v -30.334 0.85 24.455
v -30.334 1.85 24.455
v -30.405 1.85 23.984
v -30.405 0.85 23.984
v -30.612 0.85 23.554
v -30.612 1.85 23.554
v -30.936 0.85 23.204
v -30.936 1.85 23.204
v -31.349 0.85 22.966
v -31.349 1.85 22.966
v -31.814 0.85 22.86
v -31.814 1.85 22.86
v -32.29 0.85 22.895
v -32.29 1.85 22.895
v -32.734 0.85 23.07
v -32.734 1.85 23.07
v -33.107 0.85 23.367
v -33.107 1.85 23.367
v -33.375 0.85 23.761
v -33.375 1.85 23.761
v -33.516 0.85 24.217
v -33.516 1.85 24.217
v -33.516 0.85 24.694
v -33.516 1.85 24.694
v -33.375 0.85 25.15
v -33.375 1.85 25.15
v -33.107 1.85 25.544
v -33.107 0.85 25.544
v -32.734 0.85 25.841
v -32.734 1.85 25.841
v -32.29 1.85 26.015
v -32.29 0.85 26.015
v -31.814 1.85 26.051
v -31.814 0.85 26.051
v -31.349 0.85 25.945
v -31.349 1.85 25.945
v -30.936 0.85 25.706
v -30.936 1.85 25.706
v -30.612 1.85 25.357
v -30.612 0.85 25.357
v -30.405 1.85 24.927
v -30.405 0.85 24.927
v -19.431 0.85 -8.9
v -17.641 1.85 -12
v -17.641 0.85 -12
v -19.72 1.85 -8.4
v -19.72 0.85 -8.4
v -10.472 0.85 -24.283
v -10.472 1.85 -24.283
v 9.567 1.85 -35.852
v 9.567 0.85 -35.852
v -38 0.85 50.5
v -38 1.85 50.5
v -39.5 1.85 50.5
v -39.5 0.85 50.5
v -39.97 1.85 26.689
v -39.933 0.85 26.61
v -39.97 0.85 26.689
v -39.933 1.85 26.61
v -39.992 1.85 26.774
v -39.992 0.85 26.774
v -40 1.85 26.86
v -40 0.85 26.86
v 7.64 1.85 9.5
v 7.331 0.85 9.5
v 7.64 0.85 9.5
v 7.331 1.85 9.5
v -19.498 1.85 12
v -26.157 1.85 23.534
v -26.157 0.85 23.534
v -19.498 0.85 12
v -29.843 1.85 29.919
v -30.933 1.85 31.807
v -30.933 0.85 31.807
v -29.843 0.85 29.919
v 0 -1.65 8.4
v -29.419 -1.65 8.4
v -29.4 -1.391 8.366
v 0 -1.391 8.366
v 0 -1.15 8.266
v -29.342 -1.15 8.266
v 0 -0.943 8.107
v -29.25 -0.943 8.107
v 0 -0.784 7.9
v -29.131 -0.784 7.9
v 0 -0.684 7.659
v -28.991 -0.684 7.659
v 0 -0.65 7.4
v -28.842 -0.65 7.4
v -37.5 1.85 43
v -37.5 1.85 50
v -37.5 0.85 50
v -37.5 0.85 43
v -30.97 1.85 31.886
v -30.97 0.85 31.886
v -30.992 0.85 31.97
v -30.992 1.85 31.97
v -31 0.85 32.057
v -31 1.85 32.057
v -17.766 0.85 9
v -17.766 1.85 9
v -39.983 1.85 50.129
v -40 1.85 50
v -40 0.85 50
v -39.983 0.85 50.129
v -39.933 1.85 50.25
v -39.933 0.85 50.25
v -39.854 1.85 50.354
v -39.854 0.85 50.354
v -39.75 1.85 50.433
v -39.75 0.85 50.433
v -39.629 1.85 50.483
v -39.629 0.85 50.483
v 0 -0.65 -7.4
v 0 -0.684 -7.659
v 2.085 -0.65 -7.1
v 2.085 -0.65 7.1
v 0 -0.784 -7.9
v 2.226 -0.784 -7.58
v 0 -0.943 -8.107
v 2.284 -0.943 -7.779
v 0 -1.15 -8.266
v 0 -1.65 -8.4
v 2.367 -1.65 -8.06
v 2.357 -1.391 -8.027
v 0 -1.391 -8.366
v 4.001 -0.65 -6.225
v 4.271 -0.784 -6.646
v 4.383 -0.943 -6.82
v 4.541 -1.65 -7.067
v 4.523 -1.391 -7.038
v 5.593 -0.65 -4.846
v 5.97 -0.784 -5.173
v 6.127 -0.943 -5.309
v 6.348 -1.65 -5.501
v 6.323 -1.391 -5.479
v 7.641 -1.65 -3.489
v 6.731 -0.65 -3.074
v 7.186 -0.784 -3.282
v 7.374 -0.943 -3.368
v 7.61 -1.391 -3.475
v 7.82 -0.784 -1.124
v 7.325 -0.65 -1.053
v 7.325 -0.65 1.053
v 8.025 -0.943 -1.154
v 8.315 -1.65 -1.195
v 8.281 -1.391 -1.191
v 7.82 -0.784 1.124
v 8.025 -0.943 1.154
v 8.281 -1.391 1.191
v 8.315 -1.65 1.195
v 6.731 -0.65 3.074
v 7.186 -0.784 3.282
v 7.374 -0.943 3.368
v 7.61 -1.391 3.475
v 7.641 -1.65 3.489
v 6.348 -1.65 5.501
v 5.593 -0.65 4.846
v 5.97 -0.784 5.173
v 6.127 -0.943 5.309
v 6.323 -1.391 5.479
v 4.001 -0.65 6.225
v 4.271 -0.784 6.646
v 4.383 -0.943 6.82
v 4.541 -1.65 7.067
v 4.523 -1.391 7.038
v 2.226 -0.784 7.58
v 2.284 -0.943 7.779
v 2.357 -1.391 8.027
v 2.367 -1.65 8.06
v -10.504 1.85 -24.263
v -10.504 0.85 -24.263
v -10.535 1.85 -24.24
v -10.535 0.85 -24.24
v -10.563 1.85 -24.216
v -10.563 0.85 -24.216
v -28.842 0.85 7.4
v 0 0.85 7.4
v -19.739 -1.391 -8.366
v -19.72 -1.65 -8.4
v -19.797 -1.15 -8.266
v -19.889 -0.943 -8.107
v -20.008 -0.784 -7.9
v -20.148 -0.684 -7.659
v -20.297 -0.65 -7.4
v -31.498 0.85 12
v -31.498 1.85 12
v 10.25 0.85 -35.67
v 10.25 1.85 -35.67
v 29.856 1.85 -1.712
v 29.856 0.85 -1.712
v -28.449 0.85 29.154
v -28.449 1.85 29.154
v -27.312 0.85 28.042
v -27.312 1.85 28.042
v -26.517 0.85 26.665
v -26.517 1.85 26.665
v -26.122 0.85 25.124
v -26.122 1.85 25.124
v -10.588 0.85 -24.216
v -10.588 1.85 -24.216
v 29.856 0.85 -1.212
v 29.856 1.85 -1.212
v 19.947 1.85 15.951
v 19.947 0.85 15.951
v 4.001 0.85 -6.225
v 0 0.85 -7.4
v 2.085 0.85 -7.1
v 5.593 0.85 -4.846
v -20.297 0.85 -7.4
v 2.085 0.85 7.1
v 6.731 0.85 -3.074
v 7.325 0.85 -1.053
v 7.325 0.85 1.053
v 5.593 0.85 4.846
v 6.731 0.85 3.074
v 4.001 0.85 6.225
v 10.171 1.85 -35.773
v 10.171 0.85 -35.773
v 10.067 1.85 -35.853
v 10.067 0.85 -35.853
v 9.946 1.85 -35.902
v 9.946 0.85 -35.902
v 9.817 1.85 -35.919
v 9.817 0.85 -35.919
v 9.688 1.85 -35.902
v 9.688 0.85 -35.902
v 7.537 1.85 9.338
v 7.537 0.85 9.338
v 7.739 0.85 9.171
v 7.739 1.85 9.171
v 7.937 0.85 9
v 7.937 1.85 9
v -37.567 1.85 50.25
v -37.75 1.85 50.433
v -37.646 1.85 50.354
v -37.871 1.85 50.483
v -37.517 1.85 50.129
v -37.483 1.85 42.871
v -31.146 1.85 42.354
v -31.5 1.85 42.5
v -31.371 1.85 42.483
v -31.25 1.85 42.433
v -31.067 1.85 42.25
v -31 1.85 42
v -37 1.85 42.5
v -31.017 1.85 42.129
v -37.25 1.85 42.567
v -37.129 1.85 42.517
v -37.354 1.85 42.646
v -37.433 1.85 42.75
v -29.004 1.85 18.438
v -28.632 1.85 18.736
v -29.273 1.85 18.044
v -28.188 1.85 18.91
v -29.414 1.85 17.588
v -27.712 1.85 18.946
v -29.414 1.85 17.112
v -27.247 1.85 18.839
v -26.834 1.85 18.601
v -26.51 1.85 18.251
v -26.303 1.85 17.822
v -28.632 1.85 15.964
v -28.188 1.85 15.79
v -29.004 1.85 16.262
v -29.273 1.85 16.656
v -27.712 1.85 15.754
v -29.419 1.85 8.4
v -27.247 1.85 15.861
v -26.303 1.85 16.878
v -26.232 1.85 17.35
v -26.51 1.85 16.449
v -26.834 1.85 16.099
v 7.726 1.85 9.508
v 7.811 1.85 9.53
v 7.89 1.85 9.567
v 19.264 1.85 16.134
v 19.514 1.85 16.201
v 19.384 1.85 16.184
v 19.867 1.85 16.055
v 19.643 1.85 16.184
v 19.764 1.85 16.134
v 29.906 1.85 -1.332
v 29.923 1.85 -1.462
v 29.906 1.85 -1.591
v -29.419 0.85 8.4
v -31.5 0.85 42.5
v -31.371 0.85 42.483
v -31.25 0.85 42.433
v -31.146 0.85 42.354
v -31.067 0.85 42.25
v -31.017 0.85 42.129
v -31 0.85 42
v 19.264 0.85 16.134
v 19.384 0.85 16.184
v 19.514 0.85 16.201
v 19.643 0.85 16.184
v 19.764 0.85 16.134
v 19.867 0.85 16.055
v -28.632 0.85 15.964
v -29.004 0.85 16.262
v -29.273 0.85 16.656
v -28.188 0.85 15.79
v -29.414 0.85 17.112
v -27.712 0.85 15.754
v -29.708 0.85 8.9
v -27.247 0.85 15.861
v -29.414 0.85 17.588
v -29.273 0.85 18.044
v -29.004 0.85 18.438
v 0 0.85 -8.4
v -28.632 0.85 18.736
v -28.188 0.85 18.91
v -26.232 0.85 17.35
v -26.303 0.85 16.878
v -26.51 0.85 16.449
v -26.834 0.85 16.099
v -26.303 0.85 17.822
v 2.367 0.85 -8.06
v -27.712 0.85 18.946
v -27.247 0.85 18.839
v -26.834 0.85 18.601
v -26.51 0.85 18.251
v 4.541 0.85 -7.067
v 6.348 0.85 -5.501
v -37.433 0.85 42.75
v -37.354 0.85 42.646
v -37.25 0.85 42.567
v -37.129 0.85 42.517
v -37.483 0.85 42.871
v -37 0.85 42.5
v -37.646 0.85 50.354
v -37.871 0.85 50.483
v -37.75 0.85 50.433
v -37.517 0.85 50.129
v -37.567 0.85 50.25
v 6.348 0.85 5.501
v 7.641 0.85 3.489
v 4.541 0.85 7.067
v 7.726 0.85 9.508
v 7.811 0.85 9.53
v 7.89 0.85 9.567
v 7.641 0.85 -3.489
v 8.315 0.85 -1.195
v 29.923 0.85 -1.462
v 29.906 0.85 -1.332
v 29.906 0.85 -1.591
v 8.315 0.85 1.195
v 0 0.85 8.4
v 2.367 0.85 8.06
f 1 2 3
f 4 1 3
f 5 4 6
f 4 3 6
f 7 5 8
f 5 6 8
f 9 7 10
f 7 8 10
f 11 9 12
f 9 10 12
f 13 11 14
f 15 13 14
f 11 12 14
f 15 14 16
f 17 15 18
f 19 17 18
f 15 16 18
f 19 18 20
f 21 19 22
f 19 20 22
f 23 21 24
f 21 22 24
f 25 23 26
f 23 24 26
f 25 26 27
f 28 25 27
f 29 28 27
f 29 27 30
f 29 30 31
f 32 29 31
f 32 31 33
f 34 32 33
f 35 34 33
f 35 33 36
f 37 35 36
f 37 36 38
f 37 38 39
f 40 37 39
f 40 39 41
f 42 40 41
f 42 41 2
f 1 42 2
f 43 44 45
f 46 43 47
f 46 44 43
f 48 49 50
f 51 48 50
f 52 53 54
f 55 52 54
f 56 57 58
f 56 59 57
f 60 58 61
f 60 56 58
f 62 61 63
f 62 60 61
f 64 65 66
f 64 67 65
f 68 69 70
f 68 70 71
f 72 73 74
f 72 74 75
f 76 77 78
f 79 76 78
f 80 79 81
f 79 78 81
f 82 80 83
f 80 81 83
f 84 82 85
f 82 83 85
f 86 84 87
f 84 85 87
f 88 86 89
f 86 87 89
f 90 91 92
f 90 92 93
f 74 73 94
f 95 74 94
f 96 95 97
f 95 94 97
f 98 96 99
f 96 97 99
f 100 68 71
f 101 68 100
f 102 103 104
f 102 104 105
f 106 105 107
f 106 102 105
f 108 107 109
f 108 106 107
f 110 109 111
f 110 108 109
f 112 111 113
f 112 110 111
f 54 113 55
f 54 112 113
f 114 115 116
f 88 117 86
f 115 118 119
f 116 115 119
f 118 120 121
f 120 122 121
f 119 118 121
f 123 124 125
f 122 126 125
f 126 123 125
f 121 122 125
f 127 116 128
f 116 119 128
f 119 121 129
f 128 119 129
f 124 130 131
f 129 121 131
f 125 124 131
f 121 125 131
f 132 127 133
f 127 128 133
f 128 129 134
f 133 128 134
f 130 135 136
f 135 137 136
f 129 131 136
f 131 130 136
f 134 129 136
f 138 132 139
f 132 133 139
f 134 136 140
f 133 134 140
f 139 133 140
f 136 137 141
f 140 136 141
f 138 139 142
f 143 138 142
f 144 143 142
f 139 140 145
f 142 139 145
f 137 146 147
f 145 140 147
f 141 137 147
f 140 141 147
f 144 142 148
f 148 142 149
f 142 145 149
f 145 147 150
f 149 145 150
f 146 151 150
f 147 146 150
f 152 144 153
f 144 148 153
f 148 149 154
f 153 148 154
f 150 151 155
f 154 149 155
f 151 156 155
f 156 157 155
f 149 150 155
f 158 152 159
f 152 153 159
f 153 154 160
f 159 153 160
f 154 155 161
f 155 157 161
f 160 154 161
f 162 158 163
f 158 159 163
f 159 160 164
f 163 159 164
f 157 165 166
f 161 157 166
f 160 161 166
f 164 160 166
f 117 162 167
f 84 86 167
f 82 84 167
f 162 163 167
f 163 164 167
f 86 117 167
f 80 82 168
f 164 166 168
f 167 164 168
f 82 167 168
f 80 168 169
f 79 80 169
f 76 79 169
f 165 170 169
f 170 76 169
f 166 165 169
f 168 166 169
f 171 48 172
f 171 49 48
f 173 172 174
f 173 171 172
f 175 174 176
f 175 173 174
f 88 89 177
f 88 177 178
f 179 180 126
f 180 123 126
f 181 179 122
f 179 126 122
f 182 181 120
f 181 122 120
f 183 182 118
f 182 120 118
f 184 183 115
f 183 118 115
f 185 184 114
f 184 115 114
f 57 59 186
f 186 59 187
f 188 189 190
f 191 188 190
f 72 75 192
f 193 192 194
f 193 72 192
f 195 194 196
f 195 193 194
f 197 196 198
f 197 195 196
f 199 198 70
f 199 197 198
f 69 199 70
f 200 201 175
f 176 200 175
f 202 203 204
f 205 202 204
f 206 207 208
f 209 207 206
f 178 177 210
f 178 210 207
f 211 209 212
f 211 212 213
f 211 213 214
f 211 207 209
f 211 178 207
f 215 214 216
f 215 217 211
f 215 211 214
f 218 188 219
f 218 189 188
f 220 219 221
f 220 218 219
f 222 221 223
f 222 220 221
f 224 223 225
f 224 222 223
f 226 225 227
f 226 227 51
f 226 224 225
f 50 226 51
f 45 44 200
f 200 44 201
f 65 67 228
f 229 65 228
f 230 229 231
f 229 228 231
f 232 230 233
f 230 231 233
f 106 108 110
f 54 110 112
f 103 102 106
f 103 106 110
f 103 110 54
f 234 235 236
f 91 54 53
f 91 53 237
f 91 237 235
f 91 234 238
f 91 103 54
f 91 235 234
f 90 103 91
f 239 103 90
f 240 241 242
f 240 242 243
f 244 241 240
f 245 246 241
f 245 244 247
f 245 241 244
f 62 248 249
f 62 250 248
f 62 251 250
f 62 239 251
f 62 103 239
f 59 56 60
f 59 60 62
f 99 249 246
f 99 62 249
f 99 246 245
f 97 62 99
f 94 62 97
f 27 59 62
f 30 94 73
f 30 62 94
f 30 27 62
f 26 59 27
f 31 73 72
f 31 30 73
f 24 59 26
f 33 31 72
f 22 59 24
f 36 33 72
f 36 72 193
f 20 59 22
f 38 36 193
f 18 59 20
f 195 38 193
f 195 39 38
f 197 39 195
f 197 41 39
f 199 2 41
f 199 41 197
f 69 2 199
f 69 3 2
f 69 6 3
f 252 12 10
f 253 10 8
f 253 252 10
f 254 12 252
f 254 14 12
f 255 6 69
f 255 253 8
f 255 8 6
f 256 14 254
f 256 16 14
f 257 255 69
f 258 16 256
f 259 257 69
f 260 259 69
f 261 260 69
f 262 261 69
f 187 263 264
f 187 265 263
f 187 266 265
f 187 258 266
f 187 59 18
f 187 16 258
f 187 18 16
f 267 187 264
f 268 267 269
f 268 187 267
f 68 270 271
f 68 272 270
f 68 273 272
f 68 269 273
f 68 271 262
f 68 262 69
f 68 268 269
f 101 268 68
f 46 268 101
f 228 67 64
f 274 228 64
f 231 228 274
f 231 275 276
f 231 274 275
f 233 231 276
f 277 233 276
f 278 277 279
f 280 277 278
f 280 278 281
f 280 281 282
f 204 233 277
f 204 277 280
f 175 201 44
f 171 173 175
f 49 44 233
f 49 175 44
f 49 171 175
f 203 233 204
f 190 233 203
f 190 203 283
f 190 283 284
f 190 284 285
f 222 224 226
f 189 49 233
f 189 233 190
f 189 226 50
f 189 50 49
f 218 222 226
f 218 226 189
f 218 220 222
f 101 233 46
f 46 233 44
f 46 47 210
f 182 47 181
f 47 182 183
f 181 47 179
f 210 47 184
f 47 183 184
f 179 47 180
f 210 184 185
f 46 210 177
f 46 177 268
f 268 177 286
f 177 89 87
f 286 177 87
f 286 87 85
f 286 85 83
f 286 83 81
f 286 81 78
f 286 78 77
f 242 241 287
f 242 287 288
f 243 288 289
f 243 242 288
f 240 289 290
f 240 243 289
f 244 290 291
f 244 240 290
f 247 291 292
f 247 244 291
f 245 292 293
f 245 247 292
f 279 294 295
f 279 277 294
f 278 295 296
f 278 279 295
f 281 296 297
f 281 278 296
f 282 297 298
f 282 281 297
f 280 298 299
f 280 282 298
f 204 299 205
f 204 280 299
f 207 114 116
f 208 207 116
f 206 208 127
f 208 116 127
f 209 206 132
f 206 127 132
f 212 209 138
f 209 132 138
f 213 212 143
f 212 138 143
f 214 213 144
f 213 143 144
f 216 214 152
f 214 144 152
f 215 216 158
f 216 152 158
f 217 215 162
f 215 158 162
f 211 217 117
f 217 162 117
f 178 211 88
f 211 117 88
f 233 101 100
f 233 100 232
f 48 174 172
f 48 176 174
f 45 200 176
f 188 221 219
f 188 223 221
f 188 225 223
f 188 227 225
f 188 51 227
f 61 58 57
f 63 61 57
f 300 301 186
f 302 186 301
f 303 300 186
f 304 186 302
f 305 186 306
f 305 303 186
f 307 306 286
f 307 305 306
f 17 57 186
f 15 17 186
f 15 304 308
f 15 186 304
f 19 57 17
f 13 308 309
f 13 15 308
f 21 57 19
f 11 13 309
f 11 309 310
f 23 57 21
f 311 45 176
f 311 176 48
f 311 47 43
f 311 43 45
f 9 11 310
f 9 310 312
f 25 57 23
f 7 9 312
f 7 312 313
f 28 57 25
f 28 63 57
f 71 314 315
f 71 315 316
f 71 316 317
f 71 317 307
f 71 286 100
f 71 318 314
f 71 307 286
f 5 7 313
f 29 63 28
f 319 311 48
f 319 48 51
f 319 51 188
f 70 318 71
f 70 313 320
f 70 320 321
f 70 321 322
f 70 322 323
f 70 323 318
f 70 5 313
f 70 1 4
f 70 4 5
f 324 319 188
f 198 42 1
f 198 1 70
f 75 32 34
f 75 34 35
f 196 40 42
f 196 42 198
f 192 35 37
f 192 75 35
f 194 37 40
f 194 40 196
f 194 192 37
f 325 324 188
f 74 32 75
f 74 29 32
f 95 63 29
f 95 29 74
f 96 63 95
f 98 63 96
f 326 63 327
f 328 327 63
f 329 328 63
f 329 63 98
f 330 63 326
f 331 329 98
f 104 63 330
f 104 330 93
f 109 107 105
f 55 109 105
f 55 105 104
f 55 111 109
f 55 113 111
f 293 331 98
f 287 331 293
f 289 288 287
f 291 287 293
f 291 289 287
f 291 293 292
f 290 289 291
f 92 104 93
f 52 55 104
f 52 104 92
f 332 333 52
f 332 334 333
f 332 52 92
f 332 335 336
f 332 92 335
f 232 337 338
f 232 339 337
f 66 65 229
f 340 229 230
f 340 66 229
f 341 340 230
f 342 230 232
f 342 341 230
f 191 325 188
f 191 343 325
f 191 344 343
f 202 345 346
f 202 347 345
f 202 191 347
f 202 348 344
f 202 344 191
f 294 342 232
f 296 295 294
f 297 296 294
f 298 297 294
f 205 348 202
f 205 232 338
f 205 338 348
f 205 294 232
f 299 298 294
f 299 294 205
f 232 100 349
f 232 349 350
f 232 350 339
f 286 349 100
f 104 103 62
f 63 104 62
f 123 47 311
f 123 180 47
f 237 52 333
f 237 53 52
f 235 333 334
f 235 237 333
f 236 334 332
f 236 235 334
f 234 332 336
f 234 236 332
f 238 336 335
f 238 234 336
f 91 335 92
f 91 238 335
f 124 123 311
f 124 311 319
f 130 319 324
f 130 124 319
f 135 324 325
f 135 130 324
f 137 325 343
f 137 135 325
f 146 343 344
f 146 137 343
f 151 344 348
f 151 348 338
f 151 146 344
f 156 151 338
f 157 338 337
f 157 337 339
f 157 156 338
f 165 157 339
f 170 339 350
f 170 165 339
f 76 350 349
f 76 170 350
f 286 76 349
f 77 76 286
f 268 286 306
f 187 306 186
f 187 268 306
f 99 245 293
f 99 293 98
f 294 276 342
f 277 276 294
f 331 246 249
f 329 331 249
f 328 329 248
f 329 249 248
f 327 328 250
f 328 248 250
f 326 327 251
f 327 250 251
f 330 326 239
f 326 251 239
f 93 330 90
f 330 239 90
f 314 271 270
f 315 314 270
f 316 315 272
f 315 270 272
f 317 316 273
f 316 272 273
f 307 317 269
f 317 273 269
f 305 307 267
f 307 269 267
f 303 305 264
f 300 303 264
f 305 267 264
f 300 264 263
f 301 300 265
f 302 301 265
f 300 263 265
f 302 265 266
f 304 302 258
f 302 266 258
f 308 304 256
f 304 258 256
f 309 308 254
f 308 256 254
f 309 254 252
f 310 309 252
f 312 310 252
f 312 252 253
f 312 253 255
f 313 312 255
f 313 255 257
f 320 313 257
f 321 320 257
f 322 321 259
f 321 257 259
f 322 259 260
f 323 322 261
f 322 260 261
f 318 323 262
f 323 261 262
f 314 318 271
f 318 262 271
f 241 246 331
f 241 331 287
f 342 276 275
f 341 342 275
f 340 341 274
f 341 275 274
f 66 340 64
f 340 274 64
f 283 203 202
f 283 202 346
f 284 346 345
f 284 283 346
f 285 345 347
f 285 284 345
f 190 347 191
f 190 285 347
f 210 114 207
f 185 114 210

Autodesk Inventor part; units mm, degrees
ref_plane "YZ Plane" through (0, 0, 0) normal (1, 0, 0) x (0, 1, 0)
ref_plane "XZ Plane" through (0, 0, 0) normal (0, 1, 0) x (-1, 0, 0)
sketch "スケッチ1" plane through (0, 0, 0) normal (0, 1, 0) x (-1, 0, 0)
  circle A0 centre (0, 0) radius 8.9
  line L0 (0, -8.9) -> (63.2748, -8.9)
  line L1 (63.2748, -8.9) -> (63.2748, 8.9)
  line L2 (63.2748, 8.9) -> (0, 8.9)
  line L3 (0, 8.9) -> (0, -8.9)
  circle A1 centre (0, 0) radius 8.4
  line L4 (0, -8.4) -> (63.2748, -8.4)
  line L5 (63.2748, -8.4) -> (63.2748, 8.4)
  line L6 (63.2748, 8.4) -> (0, 8.4)
  line L7 (0, 8.4) -> (0, -8.4)
  point P0 (0, 8.4)
  point P1 (0, 8.9)
  dimension "d0" = 17.8
  dimension "d1" = 16.8
extrude "押し出し1" add sketch "スケッチ1" along normal blind 0.85 contours L3 A1 A0 | L2 L1 L6 A0 | A0 L6 L3 | L3 L4 A0 | A0 L4 L1 L0
sketch "スケッチ2" plane through (0, 0.85, 0) normal (0, 1, 0) x (1, 0, 0)
  circle A0 centre (0, 0) radius 12
  line L0 (0, 12) -> (-63.2748, 12)
  line L1 (-63.2748, 12) -> (-63.2748, -12)
  line L2 (-63.2748, -12) -> (0, -12)
  line L3 (0, -12) -> (0, 12)
  line L4 (-63.2748, 8.9) -> (-63.2748, 8.4) projected
  line L5 (-63.2748, 8.4) -> (0, 8.4) projected
  line L6 (0, -8.4) -> (-63.2748, -8.4) projected
  arc A1 (0, -8.4) -> (0, 8.4) centre (0, 0) ccw projected
  point P0 (0, -12)
  dimension "d4" = 24
extrude "押し出し2" add sketch "スケッチ2" along normal blind 1 contours A0 L3 A1 | L3 L5 A0 | A0 L5 L1 L0 | L2 L1 L6 A0 | A0 L6 L3
mirror "ミラー1" about plane through (-27.1874, 0, 0) normal (0, -1, 0)
sketch "スケッチ3" plane through (0, 1.85, 0) normal (0, 1, 0) x (1, 0, 0)
  line L0 (-14.7409, 17.0236) -> (-35.8476, -19.5343) projected
  line L1 (0, -8.4) -> (-63.2748, -8.4) projected
  line L2 (-63.2748, -8.4) -> (-63.2748, -12) projected
  line L3 (-63.2748, -12) -> (0, -12) projected
  arc A0 (0, -12) -> (0, 12) centre (0, 0) ccw projected
  line L4 (0, 12) -> (-63.2748, 12) projected
  line L5 (-63.2748, 12) -> (-63.2748, 8.4) projected
  line L6 (-63.2748, 8.4) -> (0, 8.4) projected
  arc A1 (0, -8.4) -> (0, 8.4) centre (0, 0) ccw projected
  point P0 (-31.4977, -12)
  point P1 (-29.4192, -8.4)
  point P2 (-19.7197, 8.4)
  point P3 (-17.6412, 12)
extrude "押し出し3" cut sketch "スケッチ3" against normal through all contours L0 L6 L5 L4 | L0 L3 L2 L1
ref_plane "作業平面1" through (0, -0.65, 0) normal (0, 1, 0) x (1, 0, 0)
sketch "スケッチ4" plane through (0, -0.65, 0) normal (0, 1, 0) x (1, 0, 0)
  line L0 (-19.7197, 8.4) -> (0, 8.4) projected
  arc A0 (0, -8.4) -> (0, 8.4) centre (0, 0) ccw projected
  line L1 (0, -8.4) -> (-29.4192, -8.4) projected
  line L2 (-19.7197, 8.4) -> (-29.4192, -8.4)
  circle A1 centre (0, 0) radius 1.6
  dimension "d10" = 3.2
extrude "押し出し4" add sketch "スケッチ4" along normal up to surface (2.5 mm away)
fillet "フィレット1" radius 1 3 edges at (-9.8599, -0.65, -8.4) (8.4, -0.65, 0) (-14.7096, -0.65, 8.4)
sketch "スケッチ5" plane through (0, 1.85, 0) normal (0, 1, 0) x (1, 0, 0)
  circle A0 centre (-27.8315, -17.35) radius 1.6 projected
  circle A1 centre (-8.7282, 17.4379) radius 1.6 projected
  line L0 (0, 12) -> (-17.6412, 12) projected
  line L1 (-17.6412, 12) -> (-10.5885, 24.2158)
  line L2 (-10.5885, 24.2158) -> (0, 24.2158)
  line L3 (-39.933, -26.6105) -> (-10.6554, 24.0998) projected
  line L4 (0, 12) -> (-17.6412, 12) projected
  circle A2 centre (0, 0) radius 24.2158
  arc A3 (0, -12) -> (0, 12) centre (0, 0) ccw projected
  line L5 (11.4695, 3.5285) -> (5.2849, 23.6321)
  circle A4 centre (1.9592, 17.4379) radius 1.6
  line L6 (-39.933, -26.6105) -> (-10.6554, 24.0998) projected
  circle A5 centre (-31.9338, -24.4553) radius 1.6 projected
  circle A6 centre (-36, -34.6362) radius 1.6 projected
  circle A7 centre (-27.8315, -17.35) radius 1.6 projected
  line L7 (-39.933, -26.6105) -> (-10.6554, 24.0998) projected
  line L8 (-40, -50) -> (-40, -26.8605) projected
  line L9 (-38, -50.5) -> (-39.5, -50.5) projected
  line L10 (-31, -42) -> (-31, -32.0566) projected
  line L11 (-30.933, -31.8066) -> (-18.1986, -9.75) projected
  line L12 (-37.5, -50) -> (-37.5, -43) projected
  line L13 (-37, -42.5) -> (-31.5, -42.5) projected
  circle A8 centre (-31.9338, -24.4553) radius 5.85
  arc A9 (19.2639, -16.134) -> (19.9469, -15.951) centre (19.5139, -15.701) ccw projected
  line L14 (29.8557, 1.2115) -> (19.9469, -15.951) projected
  arc A10 (29.8557, 1.2115) -> (29.8557, 1.7115) centre (29.4226, 1.4615) ccw projected
  line L15 (10.25, 35.6695) -> (29.8557, 1.7115) projected
  arc A11 (10.25, 35.6695) -> (9.567, 35.8525) centre (9.817, 35.4195) ccw projected
  line L16 (-10.4724, 24.2828) -> (9.567, 35.8525) projected
  arc A12 (-10.4724, 24.2828) -> (-10.6554, 24.0998) centre (-10.2224, 23.8498) ccw projected
  arc A13 (-39.933, -26.6105) -> (-40, -26.8605) centre (-39.5, -26.8605) ccw projected
  arc A14 (-40, -50) -> (-39.5, -50.5) centre (-39.5, -50) ccw projected
  arc A15 (-38, -50.5) -> (-37.5, -50) centre (-38, -50) ccw projected
  arc A16 (-37, -42.5) -> (-37.5, -43) centre (-37, -43) ccw projected
  arc A17 (-31.5, -42.5) -> (-31, -42) centre (-31.5, -42) ccw projected
  arc A18 (-30.933, -31.8066) -> (-31, -32.0566) centre (-30.5, -32.0566) ccw projected
  arc A19 (-17.7656, -9.5) -> (-18.1986, -9.75) centre (-17.7656, -10) ccw projected
  line L17 (-17.7656, -9.5) -> (7.6395, -9.5) projected
  arc A20 (7.8895, -9.567) -> (7.6395, -9.5) centre (7.6395, -10) ccw projected
  line L18 (7.8895, -9.567) -> (19.2639, -16.134) projected
  circle A21 centre (1.9592, 17.4379) radius 1.6 projected
  circle A22 centre (24.5152, 1.2615) radius 1.6 projected
  circle A23 centre (5.1388, 27.5224) radius 1.6 projected
  circle A24 centre (13.1994, 17.561) radius 1.6 projected
  circle A25 centre (20.4199, -5.8317) radius 1.6 projected
  circle A26 centre (-8.7282, 17.4379) radius 1.6 projected
  circle A27 centre (0, 0) radius 1.5 projected
  point P0 (0, 24.2158)
  point P1 (-20.2427, -13.2905)
  point P2 (-12.6465, 20.6512)
  point P3 (-37, -21.5303)
  point P4 (-29.8432, -29.9191)
  point P5 (-26.1568, -23.5339)
  dimension "d14" = 15
  dimension "d15" = 3.2
  dimension "d16" = 5
extrude "押し出し5" add sketch "スケッチ5" against normal blind 1 contours A1 | A3 L17 A19 L11 A2 L3 L0 | L0 L1 A2 L5 A3 | L5 A2 A22 L18 A20 L17 A3 | L1 A12 L2 A2 | A2 L11 A8 L3 | A2 L2 A12 L16 A11 L15 A10 L14 A9 L18 A22 | L1 L2 A12 | A8 L11 A18 L10 A17 L13 A16 L12 A15 L9 A14 L8 A13 L3 | A8 L11 | A22 A2 | A2 A22 | A8 L11 | A4 | A6 | A23 | A24 | A25 | A27
sketch "スケッチ6" plane through (0, 1.85, 0) normal (0, 1, 0) x (1, 0, 0)
  line L0 (-19.4977, -12) -> (0, -12) projected
  line L1 (-19.4977, -12) -> (-17.7656, -9)
  line L2 (-17.7656, -9) -> (7.9373, -9)
  arc A0 (0, -12) -> (0, 12) centre (0, 0) ccw projected
  line L3 (-29.8432, -29.9191) -> (-19.4977, -12) projected
  point P0 (-25.741, -22.8137)
  point P1 (-20.2427, -13.2905)
  point P2 (-31, -31.9226)
  dimension "d19" = 3
extrude "押し出し6" cut sketch "スケッチ6" against normal through all
sketch "スケッチ7" plane through (0, -1.85, 0) normal (0, -1, 0) x (1, 0, 0)
  line L0 (-19.3733, -9) -> (0, -9) projected
  line L1 (-17.7656, 9) -> (-19.4977, 12) projected
  line L2 (-31.4977, 12) -> (-19.4977, 12) projected
  line L3 (-31.4977, 12) -> (-29.4192, 8.4) projected
  line L4 (0, 8.4) -> (-29.4192, 8.4) projected
  arc A0 (0, -8.4) -> (0, 8.4) centre (0, 0) ccw projected
  line L5 (-19.7197, -8.4) -> (0, -8.4) projected
  line L6 (-19.7197, -8.4) -> (-17.6412, -12) projected
  line L7 (0, -12) -> (-17.6412, -12) projected
  arc A1 (0, -12) -> (7.9373, 9) centre (0, 0) ccw projected
  line L8 (7.9373, 9) -> (-17.7656, 9) projected
  circle A2 centre (0, 0) radius 1.6 projected
  line L9 (0, -7.4) -> (-20.2971, -7.4) projected
  arc A3 (0, -7.4) -> (0, 7.4) centre (0, 0) ccw projected
  line L10 (-28.8418, 7.4) -> (0, 7.4) projected
  line L11 (-20.2971, -7.4) -> (-28.8418, 7.4) projected
  circle A4 centre (0, 0) radius 9 projected
  line L12 (-17.7656, 9) -> (7.9373, 9) projected
  line L13 (-10.5631, -24.2158) -> (-10.5885, -24.2158) projected
  arc A5 (-26.1568, 23.5339) -> (-29.8432, 29.9191) centre (-31.9338, 24.4553) ccw projected
  line L14 (-26.1568, 23.5339) -> (-17.7656, 9) projected
  circle A6 centre (-27.8315, 17.35) radius 1.6 projected
  circle A7 centre (-31.9338, 24.4553) radius 1.6 projected
  arc A8 (7.9373, 9) -> (7.3314, 9.5) centre (0, 0) ccw projected
  line L15 (7.3314, 9.5) -> (7.6395, 9.5) projected
  arc A9 (7.6395, 9.5) -> (7.8895, 9.567) centre (7.6395, 10) ccw projected
  line L16 (7.8895, 9.567) -> (19.2639, 16.134) projected
  arc A10 (19.9469, 15.951) -> (19.2639, 16.134) centre (19.5139, 15.701) ccw projected
  line L17 (19.9469, 15.951) -> (29.8557, -1.2115) projected
  arc A11 (29.8557, -1.7115) -> (29.8557, -1.2115) centre (29.4226, -1.4615) ccw projected
  line L18 (29.8557, -1.7115) -> (10.25, -35.6695) projected
  arc A12 (9.567, -35.8525) -> (10.25, -35.6695) centre (9.817, -35.4195) ccw projected
  line L19 (9.567, -35.8525) -> (-10.4724, -24.2828) projected
  arc A13 (-10.5631, -24.2158) -> (-10.4724, -24.2828) centre (-10.2224, -23.8498) ccw projected
  line L20 (-10.5885, -24.2158) -> (-39.933, 26.6105) projected
  arc A14 (-40, 26.8605) -> (-39.933, 26.6105) centre (-39.5, 26.8605) ccw projected
  line L21 (-40, 26.8605) -> (-40, 50) projected
  arc A15 (-39.5, 50.5) -> (-40, 50) centre (-39.5, 50) ccw projected
  line L22 (-39.5, 50.5) -> (-38, 50.5) projected
  arc A16 (-37.5, 50) -> (-38, 50.5) centre (-38, 50) ccw projected
  line L23 (-37.5, 50) -> (-37.5, 43) projected
  arc A17 (-37.5, 43) -> (-37, 42.5) centre (-37, 43) ccw projected
  line L24 (-37, 42.5) -> (-31.5, 42.5) projected
  arc A18 (-31, 42) -> (-31.5, 42.5) centre (-31.5, 42) ccw projected
  line L25 (-31, 42) -> (-31, 32.0566) projected
  arc A19 (-31, 32.0566) -> (-30.933, 31.8066) centre (-30.5, 32.0566) ccw projected
  line L26 (-30.933, 31.8066) -> (-29.8432, 29.9191) projected
extrude "押し出し7" cut sketch "スケッチ7" against normal up to surface (2.7 mm away) contours L6 L5 A4 L0 | L0 A4 L8 A1 L7 L6 | A4 L5 A0 L4 | L11 L10 A4 L9 | A4 L4 L3 L2 L1 L8 | A4 L10 A3 L9 | A2
properties part number "screw_cover_upper"
